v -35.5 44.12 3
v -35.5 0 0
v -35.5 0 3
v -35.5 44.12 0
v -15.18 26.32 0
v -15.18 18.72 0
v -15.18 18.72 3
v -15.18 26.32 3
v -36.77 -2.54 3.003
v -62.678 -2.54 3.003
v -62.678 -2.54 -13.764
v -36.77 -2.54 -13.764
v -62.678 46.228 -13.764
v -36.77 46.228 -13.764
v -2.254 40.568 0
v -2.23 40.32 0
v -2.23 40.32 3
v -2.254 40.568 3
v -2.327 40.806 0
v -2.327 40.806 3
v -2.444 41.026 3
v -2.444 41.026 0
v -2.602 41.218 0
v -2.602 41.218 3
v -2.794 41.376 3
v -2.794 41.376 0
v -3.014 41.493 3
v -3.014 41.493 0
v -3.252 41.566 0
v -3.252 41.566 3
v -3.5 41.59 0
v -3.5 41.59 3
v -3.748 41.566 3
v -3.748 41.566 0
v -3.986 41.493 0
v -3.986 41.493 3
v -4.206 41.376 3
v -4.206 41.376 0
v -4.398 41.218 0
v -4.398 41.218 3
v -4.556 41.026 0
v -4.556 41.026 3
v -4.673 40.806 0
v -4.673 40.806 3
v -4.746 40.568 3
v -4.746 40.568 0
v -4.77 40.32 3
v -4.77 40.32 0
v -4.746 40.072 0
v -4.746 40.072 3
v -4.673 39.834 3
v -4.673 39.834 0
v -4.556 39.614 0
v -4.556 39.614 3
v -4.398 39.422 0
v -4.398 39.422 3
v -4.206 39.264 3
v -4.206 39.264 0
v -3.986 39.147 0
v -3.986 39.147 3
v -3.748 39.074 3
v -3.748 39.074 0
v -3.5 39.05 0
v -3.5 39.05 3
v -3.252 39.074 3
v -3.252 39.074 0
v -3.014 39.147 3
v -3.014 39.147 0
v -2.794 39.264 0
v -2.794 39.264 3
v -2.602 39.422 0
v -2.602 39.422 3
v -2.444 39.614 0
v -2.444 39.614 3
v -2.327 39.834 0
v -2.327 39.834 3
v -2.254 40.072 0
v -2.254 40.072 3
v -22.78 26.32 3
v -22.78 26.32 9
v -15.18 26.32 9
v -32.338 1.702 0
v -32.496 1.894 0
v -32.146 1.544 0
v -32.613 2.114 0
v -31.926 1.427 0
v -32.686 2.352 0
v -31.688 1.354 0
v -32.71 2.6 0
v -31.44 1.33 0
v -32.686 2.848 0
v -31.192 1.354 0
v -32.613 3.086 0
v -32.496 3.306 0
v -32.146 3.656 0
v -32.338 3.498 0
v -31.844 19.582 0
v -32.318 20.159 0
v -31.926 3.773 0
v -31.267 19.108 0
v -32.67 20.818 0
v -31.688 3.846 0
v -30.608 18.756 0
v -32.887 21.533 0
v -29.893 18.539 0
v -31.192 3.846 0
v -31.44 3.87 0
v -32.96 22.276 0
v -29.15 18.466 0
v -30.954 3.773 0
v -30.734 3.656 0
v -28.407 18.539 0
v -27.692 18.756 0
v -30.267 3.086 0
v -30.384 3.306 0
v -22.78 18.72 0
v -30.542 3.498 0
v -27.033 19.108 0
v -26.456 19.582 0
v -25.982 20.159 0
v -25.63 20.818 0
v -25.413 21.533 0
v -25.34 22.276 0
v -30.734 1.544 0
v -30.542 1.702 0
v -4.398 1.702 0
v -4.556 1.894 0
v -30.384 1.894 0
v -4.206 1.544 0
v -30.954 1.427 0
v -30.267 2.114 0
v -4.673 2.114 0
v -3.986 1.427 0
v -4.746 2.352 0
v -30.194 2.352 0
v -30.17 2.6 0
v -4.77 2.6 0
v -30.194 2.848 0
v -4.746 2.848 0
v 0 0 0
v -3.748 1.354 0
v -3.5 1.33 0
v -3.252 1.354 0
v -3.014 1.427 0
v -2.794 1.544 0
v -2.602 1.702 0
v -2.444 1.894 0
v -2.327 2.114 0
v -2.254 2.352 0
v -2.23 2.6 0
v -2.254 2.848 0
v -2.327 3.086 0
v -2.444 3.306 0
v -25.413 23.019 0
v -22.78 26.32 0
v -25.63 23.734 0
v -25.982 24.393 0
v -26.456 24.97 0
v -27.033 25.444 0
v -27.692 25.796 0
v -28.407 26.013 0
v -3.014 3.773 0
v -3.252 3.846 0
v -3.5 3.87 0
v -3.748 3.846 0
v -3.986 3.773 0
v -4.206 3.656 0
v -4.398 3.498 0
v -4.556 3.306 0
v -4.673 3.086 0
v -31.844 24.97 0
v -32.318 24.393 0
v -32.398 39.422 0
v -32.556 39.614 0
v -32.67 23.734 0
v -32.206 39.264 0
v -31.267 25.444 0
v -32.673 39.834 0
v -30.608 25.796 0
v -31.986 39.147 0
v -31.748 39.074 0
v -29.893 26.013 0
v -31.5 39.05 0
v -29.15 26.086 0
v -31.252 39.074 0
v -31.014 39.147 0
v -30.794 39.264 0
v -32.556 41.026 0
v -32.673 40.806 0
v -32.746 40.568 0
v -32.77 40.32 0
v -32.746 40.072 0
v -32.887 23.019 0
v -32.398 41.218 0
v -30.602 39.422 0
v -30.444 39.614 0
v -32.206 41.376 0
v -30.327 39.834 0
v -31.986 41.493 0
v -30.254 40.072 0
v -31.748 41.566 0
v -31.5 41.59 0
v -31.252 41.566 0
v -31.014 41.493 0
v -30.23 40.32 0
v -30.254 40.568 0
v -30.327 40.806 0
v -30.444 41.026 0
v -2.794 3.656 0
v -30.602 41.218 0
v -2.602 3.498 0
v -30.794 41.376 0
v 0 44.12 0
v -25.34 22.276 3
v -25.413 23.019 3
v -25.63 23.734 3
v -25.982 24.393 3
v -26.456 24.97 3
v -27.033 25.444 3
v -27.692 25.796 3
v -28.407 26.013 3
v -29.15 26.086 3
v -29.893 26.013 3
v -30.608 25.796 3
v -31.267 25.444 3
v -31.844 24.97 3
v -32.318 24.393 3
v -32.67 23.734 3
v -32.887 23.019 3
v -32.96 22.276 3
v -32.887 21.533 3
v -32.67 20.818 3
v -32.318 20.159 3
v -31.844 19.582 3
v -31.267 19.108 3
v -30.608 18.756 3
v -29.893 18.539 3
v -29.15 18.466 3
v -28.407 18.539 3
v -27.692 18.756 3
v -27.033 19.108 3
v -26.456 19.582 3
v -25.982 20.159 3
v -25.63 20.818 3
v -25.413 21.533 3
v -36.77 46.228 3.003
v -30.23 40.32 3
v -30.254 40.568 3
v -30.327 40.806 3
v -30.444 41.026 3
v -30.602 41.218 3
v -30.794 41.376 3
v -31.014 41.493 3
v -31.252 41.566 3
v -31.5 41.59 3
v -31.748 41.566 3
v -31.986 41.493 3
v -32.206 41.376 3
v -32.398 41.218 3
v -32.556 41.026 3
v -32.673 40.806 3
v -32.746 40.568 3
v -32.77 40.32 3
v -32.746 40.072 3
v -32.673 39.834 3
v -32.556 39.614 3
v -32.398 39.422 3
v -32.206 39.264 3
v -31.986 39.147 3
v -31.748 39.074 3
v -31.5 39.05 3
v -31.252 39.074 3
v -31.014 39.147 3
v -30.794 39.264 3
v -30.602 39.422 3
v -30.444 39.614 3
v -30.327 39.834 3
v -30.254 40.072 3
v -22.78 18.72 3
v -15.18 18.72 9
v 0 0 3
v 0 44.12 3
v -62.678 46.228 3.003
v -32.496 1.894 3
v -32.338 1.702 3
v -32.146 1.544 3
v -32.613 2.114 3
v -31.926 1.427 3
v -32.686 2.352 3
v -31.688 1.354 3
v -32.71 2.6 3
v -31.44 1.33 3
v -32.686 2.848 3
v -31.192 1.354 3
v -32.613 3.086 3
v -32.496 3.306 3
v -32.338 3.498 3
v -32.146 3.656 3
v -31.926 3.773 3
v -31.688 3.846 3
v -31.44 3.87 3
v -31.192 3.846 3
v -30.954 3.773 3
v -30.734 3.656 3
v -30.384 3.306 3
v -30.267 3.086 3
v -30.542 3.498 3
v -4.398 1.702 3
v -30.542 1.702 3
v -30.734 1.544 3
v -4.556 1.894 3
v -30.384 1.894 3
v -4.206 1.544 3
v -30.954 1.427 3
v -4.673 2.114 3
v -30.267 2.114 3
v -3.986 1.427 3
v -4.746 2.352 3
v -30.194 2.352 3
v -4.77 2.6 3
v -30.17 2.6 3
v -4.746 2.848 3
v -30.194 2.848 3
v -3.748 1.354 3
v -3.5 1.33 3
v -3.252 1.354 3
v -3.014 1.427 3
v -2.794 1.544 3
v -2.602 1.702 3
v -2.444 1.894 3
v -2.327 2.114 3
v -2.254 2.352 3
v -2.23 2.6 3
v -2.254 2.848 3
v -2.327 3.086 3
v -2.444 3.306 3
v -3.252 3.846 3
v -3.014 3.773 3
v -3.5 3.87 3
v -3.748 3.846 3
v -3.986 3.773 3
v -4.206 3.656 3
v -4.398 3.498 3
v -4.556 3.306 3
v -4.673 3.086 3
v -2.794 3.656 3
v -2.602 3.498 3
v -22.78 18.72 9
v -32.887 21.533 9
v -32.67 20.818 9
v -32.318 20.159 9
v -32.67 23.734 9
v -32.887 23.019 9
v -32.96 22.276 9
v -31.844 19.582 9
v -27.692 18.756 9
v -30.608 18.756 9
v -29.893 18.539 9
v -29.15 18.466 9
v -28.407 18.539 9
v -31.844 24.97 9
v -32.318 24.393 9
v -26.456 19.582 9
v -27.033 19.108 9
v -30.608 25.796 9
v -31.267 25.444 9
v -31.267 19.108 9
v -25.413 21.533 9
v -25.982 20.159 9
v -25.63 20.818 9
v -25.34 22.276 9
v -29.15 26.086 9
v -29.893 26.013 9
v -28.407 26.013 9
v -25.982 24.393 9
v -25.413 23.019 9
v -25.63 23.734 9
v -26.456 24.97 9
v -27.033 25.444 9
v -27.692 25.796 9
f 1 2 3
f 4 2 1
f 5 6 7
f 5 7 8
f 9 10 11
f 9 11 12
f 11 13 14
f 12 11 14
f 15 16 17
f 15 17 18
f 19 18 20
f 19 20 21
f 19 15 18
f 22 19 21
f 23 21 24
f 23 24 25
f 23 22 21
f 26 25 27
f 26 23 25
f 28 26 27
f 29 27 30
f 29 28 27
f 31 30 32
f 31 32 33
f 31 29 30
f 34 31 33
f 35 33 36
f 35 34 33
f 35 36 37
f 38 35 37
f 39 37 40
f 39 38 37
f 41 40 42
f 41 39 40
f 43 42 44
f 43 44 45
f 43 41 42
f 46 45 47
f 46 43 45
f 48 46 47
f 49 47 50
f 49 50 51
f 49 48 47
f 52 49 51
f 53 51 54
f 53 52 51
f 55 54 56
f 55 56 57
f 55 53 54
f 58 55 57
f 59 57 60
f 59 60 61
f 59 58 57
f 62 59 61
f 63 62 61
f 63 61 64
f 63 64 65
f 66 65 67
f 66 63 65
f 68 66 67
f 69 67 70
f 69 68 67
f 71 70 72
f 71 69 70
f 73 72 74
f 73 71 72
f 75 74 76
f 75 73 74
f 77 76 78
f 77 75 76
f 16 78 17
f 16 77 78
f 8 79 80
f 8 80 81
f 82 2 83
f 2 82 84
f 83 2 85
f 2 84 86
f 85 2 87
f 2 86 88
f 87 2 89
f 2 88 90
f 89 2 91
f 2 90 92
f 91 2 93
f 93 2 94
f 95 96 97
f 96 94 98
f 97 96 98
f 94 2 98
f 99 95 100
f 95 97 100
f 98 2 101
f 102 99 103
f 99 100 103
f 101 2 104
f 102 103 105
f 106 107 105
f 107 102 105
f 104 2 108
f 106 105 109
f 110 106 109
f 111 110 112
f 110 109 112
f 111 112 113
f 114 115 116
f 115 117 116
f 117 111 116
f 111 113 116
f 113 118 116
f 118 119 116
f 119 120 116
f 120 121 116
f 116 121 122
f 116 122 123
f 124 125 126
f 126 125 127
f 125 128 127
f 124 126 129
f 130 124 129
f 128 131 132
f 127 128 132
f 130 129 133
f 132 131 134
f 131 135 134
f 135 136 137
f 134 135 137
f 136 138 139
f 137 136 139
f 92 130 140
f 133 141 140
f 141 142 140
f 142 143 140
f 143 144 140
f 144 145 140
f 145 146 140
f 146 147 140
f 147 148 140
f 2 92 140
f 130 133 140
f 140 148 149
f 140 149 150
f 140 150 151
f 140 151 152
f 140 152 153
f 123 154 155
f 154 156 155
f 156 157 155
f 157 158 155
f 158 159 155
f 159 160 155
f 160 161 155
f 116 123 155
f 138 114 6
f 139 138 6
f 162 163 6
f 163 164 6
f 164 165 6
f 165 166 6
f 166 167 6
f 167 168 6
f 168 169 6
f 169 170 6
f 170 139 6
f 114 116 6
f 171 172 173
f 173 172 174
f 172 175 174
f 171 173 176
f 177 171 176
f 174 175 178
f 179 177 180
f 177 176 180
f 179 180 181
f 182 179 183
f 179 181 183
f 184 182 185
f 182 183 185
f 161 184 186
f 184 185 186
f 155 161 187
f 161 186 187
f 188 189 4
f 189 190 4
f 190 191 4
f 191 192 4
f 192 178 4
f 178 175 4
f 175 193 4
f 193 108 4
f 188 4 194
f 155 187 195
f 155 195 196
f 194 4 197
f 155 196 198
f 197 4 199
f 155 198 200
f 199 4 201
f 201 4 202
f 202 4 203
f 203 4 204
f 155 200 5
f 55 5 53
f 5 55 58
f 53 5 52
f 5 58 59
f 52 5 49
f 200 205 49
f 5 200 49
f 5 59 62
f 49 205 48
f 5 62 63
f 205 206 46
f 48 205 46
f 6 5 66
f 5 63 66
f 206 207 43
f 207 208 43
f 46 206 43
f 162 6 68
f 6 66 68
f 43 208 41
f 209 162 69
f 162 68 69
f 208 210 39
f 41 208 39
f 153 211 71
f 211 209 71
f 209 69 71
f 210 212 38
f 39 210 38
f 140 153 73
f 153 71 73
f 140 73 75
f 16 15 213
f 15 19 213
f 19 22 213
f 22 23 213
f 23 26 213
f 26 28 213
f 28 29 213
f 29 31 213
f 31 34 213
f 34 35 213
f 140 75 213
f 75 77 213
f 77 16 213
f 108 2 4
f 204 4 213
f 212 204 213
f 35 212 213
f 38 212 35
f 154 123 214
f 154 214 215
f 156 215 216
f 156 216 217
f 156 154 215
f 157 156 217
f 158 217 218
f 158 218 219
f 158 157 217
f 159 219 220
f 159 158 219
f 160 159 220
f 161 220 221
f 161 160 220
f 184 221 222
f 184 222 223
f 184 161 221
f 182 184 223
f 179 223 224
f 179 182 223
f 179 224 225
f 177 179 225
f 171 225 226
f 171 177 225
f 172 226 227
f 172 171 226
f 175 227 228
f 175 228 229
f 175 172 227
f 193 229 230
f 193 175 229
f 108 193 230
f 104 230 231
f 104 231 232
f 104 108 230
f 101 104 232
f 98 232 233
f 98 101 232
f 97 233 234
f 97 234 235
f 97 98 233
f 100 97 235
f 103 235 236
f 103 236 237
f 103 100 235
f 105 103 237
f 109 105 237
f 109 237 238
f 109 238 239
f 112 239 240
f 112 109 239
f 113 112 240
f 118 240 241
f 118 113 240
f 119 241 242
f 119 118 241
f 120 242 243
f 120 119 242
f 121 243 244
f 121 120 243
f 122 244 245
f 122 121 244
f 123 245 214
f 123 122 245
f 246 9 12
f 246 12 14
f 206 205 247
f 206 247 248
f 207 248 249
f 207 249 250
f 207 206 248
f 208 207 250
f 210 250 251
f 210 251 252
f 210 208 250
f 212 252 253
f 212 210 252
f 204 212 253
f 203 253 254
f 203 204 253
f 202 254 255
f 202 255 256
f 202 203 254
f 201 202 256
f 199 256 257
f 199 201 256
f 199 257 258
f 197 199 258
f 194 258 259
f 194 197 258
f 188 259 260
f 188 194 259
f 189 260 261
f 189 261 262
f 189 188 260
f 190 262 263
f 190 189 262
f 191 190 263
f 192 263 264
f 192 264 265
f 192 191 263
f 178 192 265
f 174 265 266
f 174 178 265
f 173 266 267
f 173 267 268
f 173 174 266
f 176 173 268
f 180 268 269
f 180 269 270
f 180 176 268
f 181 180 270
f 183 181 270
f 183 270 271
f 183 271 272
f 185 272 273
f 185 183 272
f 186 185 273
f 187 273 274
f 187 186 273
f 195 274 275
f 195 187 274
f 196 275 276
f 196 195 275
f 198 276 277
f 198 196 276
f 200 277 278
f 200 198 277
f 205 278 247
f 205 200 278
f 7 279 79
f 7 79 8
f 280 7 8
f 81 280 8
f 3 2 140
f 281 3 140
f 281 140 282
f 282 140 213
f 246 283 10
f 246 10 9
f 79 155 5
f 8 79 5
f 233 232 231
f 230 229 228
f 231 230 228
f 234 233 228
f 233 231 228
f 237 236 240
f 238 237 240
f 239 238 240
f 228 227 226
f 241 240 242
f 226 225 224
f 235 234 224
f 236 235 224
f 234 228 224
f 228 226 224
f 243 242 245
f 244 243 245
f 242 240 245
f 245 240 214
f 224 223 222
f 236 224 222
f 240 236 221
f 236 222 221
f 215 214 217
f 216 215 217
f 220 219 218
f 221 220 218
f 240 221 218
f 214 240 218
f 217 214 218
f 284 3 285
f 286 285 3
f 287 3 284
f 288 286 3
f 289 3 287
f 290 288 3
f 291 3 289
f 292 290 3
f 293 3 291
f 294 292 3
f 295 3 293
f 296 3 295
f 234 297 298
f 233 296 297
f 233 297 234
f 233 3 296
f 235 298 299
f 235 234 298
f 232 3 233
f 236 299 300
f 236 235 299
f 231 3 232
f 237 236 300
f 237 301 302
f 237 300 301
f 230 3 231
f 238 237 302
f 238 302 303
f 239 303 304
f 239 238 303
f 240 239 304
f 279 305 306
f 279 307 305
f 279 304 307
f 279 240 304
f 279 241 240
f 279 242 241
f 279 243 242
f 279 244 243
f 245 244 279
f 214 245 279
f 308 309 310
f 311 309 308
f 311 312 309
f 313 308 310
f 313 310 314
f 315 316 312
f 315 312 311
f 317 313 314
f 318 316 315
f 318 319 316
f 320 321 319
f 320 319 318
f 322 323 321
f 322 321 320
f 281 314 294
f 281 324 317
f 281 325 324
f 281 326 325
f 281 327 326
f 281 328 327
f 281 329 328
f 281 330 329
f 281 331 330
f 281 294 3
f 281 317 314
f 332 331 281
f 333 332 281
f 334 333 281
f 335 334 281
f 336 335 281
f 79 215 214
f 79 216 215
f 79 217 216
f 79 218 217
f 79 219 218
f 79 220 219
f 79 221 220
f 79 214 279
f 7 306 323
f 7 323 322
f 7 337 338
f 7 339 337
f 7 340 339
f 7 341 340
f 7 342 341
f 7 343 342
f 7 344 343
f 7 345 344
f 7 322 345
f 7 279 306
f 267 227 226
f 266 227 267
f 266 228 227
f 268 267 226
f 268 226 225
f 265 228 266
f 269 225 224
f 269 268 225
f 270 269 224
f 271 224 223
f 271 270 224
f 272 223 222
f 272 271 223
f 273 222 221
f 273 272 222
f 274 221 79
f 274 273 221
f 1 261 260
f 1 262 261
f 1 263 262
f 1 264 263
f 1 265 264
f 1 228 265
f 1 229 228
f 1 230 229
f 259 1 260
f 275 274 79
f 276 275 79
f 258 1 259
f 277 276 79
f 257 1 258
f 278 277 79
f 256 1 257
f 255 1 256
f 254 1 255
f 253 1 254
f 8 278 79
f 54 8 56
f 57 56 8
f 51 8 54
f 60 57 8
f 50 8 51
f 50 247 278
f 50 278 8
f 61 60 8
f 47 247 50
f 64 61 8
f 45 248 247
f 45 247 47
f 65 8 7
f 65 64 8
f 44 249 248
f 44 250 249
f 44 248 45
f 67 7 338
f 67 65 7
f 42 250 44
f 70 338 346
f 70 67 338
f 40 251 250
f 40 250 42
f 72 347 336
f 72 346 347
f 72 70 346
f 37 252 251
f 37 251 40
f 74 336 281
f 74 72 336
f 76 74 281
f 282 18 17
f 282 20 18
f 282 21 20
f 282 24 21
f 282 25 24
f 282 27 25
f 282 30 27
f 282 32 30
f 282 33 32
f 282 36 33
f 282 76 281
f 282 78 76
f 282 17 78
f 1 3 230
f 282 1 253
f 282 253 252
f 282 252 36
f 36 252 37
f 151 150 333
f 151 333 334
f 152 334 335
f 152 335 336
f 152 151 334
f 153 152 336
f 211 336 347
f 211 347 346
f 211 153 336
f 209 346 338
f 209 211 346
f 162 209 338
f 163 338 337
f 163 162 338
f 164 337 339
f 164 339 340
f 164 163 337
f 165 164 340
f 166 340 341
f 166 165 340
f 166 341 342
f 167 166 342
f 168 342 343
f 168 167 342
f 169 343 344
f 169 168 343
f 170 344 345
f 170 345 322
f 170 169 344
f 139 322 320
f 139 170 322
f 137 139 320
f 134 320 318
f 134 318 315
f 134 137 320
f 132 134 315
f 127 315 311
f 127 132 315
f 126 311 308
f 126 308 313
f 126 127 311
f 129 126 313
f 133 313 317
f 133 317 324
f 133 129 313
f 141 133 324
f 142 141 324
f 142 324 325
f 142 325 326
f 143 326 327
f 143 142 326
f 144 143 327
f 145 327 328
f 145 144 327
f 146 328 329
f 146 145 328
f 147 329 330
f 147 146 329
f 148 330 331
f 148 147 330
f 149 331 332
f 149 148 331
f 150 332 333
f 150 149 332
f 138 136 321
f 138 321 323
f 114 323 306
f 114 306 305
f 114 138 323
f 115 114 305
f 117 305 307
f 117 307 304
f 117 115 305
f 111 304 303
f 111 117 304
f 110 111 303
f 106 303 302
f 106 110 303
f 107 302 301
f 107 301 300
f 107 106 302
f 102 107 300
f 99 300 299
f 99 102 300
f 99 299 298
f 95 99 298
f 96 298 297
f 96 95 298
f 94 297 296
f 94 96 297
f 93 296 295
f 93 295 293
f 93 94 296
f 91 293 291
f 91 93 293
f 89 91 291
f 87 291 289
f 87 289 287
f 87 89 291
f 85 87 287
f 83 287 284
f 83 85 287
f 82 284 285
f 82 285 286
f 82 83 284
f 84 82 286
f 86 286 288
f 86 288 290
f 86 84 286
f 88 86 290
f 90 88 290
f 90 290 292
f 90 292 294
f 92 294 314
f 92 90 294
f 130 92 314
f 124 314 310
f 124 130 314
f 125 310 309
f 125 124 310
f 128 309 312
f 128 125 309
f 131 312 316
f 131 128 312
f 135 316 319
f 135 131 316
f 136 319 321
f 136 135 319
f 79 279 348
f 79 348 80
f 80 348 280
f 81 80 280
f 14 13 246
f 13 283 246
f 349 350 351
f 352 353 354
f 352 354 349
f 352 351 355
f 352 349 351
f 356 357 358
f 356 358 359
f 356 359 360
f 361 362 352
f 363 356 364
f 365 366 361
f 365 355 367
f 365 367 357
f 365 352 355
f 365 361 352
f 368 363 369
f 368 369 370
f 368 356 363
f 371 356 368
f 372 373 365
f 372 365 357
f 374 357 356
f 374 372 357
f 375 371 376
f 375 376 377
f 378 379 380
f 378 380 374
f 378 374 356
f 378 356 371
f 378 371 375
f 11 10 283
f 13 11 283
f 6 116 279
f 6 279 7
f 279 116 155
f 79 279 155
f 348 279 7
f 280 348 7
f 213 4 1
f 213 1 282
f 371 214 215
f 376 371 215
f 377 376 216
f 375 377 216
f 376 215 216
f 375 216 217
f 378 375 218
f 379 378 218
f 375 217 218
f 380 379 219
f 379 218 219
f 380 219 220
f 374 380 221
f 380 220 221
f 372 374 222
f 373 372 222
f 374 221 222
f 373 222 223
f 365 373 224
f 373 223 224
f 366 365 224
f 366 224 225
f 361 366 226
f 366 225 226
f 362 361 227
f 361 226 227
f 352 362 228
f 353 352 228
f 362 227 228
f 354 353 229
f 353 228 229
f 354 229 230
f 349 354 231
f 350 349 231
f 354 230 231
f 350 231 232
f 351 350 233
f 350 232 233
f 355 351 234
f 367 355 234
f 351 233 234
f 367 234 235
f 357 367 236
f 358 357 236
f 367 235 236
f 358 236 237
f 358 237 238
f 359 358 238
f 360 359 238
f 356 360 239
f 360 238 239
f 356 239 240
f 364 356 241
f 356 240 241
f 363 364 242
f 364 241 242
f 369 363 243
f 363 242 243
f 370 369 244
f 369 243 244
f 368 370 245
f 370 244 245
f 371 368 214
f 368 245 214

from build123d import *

# Parameters (mm, degrees)
SKETCH1_W                = 35.5
SKETCH1_H                = 44.12
SKETCH1_R                = 3.81
SKETCH1_R_2              = 1.27
SKETCH1_W_2              = 7.6
SKETCH1_H_2              = 7.6
BOSS_EXTRUDE1_DEPTH      = 3
SKETCH2_W                = 25.908
SKETCH2_H                = 48.768
BOSS_EXTRUDE4_DEPTH      = 0.00254
BOSS_EXTRUDE4_DEPTH_BACK = 16.764
SKETCH3_R                = 3.81
BOSS_EXTRUDE5_DEPTH      = 6
SKETCH3_W                = 7.6
SKETCH3_H                = 7.6
BOSS_EXTRUDE5_2_DEPTH    = 6


with BuildPart() as part:
    # Sketch1 → Boss-Extrude1 (new body)
    with BuildSketch(Plane.XY):
        with Locations((-17.75, 22.06)):
            Rectangle(SKETCH1_W, SKETCH1_H)
        with Locations((-29.15, 22.276)):
            Circle(SKETCH1_R, mode=Mode.SUBTRACT)
        with Locations((-31.44, 2.6)):
            Circle(SKETCH1_R_2, mode=Mode.SUBTRACT)
        with Locations((-3.5, 2.6)):
            Circle(SKETCH1_R_2, mode=Mode.SUBTRACT)
        with Locations((-3.5, 40.32)):
            Circle(SKETCH1_R_2, mode=Mode.SUBTRACT)
        with Locations((-31.5, 40.32)):
            Circle(SKETCH1_R_2, mode=Mode.SUBTRACT)
        with Locations((-18.98, 22.52)):
            Rectangle(SKETCH1_W_2, SKETCH1_H_2, mode=Mode.SUBTRACT)
    extrude(amount=BOSS_EXTRUDE1_DEPTH)


with BuildPart() as body_2:
    # Sketch2 → Boss-Extrude4 (new body, two sides)
    with BuildSketch(Plane.XY.offset(3)) as boss_extrude4_sk:
        with Locations((-49.724, 21.844)):
            Rectangle(SKETCH2_W, SKETCH2_H)
    extrude(amount=BOSS_EXTRUDE4_DEPTH)
    extrude(boss_extrude4_sk.sketch, amount=-BOSS_EXTRUDE4_DEPTH_BACK)


with BuildPart() as body_3:
    # Sketch3 → Boss-Extrude5 (new body)
    with BuildSketch(Plane.XY.offset(3)):
        with Locations((-29.15, 22.276)):
            Circle(SKETCH3_R)
    extrude(amount=BOSS_EXTRUDE5_DEPTH)


with BuildPart() as body_4:
    # Sketch3 → Boss-Extrude5 2 (new body)
    with BuildSketch(Plane.XY.offset(3)):
        with Locations((-18.98, 22.52)):
            Rectangle(SKETCH3_W, SKETCH3_H)
    extrude(amount=BOSS_EXTRUDE5_2_DEPTH)


solid = Compound([part.part, body_2.part, body_3.part, body_4.part])
